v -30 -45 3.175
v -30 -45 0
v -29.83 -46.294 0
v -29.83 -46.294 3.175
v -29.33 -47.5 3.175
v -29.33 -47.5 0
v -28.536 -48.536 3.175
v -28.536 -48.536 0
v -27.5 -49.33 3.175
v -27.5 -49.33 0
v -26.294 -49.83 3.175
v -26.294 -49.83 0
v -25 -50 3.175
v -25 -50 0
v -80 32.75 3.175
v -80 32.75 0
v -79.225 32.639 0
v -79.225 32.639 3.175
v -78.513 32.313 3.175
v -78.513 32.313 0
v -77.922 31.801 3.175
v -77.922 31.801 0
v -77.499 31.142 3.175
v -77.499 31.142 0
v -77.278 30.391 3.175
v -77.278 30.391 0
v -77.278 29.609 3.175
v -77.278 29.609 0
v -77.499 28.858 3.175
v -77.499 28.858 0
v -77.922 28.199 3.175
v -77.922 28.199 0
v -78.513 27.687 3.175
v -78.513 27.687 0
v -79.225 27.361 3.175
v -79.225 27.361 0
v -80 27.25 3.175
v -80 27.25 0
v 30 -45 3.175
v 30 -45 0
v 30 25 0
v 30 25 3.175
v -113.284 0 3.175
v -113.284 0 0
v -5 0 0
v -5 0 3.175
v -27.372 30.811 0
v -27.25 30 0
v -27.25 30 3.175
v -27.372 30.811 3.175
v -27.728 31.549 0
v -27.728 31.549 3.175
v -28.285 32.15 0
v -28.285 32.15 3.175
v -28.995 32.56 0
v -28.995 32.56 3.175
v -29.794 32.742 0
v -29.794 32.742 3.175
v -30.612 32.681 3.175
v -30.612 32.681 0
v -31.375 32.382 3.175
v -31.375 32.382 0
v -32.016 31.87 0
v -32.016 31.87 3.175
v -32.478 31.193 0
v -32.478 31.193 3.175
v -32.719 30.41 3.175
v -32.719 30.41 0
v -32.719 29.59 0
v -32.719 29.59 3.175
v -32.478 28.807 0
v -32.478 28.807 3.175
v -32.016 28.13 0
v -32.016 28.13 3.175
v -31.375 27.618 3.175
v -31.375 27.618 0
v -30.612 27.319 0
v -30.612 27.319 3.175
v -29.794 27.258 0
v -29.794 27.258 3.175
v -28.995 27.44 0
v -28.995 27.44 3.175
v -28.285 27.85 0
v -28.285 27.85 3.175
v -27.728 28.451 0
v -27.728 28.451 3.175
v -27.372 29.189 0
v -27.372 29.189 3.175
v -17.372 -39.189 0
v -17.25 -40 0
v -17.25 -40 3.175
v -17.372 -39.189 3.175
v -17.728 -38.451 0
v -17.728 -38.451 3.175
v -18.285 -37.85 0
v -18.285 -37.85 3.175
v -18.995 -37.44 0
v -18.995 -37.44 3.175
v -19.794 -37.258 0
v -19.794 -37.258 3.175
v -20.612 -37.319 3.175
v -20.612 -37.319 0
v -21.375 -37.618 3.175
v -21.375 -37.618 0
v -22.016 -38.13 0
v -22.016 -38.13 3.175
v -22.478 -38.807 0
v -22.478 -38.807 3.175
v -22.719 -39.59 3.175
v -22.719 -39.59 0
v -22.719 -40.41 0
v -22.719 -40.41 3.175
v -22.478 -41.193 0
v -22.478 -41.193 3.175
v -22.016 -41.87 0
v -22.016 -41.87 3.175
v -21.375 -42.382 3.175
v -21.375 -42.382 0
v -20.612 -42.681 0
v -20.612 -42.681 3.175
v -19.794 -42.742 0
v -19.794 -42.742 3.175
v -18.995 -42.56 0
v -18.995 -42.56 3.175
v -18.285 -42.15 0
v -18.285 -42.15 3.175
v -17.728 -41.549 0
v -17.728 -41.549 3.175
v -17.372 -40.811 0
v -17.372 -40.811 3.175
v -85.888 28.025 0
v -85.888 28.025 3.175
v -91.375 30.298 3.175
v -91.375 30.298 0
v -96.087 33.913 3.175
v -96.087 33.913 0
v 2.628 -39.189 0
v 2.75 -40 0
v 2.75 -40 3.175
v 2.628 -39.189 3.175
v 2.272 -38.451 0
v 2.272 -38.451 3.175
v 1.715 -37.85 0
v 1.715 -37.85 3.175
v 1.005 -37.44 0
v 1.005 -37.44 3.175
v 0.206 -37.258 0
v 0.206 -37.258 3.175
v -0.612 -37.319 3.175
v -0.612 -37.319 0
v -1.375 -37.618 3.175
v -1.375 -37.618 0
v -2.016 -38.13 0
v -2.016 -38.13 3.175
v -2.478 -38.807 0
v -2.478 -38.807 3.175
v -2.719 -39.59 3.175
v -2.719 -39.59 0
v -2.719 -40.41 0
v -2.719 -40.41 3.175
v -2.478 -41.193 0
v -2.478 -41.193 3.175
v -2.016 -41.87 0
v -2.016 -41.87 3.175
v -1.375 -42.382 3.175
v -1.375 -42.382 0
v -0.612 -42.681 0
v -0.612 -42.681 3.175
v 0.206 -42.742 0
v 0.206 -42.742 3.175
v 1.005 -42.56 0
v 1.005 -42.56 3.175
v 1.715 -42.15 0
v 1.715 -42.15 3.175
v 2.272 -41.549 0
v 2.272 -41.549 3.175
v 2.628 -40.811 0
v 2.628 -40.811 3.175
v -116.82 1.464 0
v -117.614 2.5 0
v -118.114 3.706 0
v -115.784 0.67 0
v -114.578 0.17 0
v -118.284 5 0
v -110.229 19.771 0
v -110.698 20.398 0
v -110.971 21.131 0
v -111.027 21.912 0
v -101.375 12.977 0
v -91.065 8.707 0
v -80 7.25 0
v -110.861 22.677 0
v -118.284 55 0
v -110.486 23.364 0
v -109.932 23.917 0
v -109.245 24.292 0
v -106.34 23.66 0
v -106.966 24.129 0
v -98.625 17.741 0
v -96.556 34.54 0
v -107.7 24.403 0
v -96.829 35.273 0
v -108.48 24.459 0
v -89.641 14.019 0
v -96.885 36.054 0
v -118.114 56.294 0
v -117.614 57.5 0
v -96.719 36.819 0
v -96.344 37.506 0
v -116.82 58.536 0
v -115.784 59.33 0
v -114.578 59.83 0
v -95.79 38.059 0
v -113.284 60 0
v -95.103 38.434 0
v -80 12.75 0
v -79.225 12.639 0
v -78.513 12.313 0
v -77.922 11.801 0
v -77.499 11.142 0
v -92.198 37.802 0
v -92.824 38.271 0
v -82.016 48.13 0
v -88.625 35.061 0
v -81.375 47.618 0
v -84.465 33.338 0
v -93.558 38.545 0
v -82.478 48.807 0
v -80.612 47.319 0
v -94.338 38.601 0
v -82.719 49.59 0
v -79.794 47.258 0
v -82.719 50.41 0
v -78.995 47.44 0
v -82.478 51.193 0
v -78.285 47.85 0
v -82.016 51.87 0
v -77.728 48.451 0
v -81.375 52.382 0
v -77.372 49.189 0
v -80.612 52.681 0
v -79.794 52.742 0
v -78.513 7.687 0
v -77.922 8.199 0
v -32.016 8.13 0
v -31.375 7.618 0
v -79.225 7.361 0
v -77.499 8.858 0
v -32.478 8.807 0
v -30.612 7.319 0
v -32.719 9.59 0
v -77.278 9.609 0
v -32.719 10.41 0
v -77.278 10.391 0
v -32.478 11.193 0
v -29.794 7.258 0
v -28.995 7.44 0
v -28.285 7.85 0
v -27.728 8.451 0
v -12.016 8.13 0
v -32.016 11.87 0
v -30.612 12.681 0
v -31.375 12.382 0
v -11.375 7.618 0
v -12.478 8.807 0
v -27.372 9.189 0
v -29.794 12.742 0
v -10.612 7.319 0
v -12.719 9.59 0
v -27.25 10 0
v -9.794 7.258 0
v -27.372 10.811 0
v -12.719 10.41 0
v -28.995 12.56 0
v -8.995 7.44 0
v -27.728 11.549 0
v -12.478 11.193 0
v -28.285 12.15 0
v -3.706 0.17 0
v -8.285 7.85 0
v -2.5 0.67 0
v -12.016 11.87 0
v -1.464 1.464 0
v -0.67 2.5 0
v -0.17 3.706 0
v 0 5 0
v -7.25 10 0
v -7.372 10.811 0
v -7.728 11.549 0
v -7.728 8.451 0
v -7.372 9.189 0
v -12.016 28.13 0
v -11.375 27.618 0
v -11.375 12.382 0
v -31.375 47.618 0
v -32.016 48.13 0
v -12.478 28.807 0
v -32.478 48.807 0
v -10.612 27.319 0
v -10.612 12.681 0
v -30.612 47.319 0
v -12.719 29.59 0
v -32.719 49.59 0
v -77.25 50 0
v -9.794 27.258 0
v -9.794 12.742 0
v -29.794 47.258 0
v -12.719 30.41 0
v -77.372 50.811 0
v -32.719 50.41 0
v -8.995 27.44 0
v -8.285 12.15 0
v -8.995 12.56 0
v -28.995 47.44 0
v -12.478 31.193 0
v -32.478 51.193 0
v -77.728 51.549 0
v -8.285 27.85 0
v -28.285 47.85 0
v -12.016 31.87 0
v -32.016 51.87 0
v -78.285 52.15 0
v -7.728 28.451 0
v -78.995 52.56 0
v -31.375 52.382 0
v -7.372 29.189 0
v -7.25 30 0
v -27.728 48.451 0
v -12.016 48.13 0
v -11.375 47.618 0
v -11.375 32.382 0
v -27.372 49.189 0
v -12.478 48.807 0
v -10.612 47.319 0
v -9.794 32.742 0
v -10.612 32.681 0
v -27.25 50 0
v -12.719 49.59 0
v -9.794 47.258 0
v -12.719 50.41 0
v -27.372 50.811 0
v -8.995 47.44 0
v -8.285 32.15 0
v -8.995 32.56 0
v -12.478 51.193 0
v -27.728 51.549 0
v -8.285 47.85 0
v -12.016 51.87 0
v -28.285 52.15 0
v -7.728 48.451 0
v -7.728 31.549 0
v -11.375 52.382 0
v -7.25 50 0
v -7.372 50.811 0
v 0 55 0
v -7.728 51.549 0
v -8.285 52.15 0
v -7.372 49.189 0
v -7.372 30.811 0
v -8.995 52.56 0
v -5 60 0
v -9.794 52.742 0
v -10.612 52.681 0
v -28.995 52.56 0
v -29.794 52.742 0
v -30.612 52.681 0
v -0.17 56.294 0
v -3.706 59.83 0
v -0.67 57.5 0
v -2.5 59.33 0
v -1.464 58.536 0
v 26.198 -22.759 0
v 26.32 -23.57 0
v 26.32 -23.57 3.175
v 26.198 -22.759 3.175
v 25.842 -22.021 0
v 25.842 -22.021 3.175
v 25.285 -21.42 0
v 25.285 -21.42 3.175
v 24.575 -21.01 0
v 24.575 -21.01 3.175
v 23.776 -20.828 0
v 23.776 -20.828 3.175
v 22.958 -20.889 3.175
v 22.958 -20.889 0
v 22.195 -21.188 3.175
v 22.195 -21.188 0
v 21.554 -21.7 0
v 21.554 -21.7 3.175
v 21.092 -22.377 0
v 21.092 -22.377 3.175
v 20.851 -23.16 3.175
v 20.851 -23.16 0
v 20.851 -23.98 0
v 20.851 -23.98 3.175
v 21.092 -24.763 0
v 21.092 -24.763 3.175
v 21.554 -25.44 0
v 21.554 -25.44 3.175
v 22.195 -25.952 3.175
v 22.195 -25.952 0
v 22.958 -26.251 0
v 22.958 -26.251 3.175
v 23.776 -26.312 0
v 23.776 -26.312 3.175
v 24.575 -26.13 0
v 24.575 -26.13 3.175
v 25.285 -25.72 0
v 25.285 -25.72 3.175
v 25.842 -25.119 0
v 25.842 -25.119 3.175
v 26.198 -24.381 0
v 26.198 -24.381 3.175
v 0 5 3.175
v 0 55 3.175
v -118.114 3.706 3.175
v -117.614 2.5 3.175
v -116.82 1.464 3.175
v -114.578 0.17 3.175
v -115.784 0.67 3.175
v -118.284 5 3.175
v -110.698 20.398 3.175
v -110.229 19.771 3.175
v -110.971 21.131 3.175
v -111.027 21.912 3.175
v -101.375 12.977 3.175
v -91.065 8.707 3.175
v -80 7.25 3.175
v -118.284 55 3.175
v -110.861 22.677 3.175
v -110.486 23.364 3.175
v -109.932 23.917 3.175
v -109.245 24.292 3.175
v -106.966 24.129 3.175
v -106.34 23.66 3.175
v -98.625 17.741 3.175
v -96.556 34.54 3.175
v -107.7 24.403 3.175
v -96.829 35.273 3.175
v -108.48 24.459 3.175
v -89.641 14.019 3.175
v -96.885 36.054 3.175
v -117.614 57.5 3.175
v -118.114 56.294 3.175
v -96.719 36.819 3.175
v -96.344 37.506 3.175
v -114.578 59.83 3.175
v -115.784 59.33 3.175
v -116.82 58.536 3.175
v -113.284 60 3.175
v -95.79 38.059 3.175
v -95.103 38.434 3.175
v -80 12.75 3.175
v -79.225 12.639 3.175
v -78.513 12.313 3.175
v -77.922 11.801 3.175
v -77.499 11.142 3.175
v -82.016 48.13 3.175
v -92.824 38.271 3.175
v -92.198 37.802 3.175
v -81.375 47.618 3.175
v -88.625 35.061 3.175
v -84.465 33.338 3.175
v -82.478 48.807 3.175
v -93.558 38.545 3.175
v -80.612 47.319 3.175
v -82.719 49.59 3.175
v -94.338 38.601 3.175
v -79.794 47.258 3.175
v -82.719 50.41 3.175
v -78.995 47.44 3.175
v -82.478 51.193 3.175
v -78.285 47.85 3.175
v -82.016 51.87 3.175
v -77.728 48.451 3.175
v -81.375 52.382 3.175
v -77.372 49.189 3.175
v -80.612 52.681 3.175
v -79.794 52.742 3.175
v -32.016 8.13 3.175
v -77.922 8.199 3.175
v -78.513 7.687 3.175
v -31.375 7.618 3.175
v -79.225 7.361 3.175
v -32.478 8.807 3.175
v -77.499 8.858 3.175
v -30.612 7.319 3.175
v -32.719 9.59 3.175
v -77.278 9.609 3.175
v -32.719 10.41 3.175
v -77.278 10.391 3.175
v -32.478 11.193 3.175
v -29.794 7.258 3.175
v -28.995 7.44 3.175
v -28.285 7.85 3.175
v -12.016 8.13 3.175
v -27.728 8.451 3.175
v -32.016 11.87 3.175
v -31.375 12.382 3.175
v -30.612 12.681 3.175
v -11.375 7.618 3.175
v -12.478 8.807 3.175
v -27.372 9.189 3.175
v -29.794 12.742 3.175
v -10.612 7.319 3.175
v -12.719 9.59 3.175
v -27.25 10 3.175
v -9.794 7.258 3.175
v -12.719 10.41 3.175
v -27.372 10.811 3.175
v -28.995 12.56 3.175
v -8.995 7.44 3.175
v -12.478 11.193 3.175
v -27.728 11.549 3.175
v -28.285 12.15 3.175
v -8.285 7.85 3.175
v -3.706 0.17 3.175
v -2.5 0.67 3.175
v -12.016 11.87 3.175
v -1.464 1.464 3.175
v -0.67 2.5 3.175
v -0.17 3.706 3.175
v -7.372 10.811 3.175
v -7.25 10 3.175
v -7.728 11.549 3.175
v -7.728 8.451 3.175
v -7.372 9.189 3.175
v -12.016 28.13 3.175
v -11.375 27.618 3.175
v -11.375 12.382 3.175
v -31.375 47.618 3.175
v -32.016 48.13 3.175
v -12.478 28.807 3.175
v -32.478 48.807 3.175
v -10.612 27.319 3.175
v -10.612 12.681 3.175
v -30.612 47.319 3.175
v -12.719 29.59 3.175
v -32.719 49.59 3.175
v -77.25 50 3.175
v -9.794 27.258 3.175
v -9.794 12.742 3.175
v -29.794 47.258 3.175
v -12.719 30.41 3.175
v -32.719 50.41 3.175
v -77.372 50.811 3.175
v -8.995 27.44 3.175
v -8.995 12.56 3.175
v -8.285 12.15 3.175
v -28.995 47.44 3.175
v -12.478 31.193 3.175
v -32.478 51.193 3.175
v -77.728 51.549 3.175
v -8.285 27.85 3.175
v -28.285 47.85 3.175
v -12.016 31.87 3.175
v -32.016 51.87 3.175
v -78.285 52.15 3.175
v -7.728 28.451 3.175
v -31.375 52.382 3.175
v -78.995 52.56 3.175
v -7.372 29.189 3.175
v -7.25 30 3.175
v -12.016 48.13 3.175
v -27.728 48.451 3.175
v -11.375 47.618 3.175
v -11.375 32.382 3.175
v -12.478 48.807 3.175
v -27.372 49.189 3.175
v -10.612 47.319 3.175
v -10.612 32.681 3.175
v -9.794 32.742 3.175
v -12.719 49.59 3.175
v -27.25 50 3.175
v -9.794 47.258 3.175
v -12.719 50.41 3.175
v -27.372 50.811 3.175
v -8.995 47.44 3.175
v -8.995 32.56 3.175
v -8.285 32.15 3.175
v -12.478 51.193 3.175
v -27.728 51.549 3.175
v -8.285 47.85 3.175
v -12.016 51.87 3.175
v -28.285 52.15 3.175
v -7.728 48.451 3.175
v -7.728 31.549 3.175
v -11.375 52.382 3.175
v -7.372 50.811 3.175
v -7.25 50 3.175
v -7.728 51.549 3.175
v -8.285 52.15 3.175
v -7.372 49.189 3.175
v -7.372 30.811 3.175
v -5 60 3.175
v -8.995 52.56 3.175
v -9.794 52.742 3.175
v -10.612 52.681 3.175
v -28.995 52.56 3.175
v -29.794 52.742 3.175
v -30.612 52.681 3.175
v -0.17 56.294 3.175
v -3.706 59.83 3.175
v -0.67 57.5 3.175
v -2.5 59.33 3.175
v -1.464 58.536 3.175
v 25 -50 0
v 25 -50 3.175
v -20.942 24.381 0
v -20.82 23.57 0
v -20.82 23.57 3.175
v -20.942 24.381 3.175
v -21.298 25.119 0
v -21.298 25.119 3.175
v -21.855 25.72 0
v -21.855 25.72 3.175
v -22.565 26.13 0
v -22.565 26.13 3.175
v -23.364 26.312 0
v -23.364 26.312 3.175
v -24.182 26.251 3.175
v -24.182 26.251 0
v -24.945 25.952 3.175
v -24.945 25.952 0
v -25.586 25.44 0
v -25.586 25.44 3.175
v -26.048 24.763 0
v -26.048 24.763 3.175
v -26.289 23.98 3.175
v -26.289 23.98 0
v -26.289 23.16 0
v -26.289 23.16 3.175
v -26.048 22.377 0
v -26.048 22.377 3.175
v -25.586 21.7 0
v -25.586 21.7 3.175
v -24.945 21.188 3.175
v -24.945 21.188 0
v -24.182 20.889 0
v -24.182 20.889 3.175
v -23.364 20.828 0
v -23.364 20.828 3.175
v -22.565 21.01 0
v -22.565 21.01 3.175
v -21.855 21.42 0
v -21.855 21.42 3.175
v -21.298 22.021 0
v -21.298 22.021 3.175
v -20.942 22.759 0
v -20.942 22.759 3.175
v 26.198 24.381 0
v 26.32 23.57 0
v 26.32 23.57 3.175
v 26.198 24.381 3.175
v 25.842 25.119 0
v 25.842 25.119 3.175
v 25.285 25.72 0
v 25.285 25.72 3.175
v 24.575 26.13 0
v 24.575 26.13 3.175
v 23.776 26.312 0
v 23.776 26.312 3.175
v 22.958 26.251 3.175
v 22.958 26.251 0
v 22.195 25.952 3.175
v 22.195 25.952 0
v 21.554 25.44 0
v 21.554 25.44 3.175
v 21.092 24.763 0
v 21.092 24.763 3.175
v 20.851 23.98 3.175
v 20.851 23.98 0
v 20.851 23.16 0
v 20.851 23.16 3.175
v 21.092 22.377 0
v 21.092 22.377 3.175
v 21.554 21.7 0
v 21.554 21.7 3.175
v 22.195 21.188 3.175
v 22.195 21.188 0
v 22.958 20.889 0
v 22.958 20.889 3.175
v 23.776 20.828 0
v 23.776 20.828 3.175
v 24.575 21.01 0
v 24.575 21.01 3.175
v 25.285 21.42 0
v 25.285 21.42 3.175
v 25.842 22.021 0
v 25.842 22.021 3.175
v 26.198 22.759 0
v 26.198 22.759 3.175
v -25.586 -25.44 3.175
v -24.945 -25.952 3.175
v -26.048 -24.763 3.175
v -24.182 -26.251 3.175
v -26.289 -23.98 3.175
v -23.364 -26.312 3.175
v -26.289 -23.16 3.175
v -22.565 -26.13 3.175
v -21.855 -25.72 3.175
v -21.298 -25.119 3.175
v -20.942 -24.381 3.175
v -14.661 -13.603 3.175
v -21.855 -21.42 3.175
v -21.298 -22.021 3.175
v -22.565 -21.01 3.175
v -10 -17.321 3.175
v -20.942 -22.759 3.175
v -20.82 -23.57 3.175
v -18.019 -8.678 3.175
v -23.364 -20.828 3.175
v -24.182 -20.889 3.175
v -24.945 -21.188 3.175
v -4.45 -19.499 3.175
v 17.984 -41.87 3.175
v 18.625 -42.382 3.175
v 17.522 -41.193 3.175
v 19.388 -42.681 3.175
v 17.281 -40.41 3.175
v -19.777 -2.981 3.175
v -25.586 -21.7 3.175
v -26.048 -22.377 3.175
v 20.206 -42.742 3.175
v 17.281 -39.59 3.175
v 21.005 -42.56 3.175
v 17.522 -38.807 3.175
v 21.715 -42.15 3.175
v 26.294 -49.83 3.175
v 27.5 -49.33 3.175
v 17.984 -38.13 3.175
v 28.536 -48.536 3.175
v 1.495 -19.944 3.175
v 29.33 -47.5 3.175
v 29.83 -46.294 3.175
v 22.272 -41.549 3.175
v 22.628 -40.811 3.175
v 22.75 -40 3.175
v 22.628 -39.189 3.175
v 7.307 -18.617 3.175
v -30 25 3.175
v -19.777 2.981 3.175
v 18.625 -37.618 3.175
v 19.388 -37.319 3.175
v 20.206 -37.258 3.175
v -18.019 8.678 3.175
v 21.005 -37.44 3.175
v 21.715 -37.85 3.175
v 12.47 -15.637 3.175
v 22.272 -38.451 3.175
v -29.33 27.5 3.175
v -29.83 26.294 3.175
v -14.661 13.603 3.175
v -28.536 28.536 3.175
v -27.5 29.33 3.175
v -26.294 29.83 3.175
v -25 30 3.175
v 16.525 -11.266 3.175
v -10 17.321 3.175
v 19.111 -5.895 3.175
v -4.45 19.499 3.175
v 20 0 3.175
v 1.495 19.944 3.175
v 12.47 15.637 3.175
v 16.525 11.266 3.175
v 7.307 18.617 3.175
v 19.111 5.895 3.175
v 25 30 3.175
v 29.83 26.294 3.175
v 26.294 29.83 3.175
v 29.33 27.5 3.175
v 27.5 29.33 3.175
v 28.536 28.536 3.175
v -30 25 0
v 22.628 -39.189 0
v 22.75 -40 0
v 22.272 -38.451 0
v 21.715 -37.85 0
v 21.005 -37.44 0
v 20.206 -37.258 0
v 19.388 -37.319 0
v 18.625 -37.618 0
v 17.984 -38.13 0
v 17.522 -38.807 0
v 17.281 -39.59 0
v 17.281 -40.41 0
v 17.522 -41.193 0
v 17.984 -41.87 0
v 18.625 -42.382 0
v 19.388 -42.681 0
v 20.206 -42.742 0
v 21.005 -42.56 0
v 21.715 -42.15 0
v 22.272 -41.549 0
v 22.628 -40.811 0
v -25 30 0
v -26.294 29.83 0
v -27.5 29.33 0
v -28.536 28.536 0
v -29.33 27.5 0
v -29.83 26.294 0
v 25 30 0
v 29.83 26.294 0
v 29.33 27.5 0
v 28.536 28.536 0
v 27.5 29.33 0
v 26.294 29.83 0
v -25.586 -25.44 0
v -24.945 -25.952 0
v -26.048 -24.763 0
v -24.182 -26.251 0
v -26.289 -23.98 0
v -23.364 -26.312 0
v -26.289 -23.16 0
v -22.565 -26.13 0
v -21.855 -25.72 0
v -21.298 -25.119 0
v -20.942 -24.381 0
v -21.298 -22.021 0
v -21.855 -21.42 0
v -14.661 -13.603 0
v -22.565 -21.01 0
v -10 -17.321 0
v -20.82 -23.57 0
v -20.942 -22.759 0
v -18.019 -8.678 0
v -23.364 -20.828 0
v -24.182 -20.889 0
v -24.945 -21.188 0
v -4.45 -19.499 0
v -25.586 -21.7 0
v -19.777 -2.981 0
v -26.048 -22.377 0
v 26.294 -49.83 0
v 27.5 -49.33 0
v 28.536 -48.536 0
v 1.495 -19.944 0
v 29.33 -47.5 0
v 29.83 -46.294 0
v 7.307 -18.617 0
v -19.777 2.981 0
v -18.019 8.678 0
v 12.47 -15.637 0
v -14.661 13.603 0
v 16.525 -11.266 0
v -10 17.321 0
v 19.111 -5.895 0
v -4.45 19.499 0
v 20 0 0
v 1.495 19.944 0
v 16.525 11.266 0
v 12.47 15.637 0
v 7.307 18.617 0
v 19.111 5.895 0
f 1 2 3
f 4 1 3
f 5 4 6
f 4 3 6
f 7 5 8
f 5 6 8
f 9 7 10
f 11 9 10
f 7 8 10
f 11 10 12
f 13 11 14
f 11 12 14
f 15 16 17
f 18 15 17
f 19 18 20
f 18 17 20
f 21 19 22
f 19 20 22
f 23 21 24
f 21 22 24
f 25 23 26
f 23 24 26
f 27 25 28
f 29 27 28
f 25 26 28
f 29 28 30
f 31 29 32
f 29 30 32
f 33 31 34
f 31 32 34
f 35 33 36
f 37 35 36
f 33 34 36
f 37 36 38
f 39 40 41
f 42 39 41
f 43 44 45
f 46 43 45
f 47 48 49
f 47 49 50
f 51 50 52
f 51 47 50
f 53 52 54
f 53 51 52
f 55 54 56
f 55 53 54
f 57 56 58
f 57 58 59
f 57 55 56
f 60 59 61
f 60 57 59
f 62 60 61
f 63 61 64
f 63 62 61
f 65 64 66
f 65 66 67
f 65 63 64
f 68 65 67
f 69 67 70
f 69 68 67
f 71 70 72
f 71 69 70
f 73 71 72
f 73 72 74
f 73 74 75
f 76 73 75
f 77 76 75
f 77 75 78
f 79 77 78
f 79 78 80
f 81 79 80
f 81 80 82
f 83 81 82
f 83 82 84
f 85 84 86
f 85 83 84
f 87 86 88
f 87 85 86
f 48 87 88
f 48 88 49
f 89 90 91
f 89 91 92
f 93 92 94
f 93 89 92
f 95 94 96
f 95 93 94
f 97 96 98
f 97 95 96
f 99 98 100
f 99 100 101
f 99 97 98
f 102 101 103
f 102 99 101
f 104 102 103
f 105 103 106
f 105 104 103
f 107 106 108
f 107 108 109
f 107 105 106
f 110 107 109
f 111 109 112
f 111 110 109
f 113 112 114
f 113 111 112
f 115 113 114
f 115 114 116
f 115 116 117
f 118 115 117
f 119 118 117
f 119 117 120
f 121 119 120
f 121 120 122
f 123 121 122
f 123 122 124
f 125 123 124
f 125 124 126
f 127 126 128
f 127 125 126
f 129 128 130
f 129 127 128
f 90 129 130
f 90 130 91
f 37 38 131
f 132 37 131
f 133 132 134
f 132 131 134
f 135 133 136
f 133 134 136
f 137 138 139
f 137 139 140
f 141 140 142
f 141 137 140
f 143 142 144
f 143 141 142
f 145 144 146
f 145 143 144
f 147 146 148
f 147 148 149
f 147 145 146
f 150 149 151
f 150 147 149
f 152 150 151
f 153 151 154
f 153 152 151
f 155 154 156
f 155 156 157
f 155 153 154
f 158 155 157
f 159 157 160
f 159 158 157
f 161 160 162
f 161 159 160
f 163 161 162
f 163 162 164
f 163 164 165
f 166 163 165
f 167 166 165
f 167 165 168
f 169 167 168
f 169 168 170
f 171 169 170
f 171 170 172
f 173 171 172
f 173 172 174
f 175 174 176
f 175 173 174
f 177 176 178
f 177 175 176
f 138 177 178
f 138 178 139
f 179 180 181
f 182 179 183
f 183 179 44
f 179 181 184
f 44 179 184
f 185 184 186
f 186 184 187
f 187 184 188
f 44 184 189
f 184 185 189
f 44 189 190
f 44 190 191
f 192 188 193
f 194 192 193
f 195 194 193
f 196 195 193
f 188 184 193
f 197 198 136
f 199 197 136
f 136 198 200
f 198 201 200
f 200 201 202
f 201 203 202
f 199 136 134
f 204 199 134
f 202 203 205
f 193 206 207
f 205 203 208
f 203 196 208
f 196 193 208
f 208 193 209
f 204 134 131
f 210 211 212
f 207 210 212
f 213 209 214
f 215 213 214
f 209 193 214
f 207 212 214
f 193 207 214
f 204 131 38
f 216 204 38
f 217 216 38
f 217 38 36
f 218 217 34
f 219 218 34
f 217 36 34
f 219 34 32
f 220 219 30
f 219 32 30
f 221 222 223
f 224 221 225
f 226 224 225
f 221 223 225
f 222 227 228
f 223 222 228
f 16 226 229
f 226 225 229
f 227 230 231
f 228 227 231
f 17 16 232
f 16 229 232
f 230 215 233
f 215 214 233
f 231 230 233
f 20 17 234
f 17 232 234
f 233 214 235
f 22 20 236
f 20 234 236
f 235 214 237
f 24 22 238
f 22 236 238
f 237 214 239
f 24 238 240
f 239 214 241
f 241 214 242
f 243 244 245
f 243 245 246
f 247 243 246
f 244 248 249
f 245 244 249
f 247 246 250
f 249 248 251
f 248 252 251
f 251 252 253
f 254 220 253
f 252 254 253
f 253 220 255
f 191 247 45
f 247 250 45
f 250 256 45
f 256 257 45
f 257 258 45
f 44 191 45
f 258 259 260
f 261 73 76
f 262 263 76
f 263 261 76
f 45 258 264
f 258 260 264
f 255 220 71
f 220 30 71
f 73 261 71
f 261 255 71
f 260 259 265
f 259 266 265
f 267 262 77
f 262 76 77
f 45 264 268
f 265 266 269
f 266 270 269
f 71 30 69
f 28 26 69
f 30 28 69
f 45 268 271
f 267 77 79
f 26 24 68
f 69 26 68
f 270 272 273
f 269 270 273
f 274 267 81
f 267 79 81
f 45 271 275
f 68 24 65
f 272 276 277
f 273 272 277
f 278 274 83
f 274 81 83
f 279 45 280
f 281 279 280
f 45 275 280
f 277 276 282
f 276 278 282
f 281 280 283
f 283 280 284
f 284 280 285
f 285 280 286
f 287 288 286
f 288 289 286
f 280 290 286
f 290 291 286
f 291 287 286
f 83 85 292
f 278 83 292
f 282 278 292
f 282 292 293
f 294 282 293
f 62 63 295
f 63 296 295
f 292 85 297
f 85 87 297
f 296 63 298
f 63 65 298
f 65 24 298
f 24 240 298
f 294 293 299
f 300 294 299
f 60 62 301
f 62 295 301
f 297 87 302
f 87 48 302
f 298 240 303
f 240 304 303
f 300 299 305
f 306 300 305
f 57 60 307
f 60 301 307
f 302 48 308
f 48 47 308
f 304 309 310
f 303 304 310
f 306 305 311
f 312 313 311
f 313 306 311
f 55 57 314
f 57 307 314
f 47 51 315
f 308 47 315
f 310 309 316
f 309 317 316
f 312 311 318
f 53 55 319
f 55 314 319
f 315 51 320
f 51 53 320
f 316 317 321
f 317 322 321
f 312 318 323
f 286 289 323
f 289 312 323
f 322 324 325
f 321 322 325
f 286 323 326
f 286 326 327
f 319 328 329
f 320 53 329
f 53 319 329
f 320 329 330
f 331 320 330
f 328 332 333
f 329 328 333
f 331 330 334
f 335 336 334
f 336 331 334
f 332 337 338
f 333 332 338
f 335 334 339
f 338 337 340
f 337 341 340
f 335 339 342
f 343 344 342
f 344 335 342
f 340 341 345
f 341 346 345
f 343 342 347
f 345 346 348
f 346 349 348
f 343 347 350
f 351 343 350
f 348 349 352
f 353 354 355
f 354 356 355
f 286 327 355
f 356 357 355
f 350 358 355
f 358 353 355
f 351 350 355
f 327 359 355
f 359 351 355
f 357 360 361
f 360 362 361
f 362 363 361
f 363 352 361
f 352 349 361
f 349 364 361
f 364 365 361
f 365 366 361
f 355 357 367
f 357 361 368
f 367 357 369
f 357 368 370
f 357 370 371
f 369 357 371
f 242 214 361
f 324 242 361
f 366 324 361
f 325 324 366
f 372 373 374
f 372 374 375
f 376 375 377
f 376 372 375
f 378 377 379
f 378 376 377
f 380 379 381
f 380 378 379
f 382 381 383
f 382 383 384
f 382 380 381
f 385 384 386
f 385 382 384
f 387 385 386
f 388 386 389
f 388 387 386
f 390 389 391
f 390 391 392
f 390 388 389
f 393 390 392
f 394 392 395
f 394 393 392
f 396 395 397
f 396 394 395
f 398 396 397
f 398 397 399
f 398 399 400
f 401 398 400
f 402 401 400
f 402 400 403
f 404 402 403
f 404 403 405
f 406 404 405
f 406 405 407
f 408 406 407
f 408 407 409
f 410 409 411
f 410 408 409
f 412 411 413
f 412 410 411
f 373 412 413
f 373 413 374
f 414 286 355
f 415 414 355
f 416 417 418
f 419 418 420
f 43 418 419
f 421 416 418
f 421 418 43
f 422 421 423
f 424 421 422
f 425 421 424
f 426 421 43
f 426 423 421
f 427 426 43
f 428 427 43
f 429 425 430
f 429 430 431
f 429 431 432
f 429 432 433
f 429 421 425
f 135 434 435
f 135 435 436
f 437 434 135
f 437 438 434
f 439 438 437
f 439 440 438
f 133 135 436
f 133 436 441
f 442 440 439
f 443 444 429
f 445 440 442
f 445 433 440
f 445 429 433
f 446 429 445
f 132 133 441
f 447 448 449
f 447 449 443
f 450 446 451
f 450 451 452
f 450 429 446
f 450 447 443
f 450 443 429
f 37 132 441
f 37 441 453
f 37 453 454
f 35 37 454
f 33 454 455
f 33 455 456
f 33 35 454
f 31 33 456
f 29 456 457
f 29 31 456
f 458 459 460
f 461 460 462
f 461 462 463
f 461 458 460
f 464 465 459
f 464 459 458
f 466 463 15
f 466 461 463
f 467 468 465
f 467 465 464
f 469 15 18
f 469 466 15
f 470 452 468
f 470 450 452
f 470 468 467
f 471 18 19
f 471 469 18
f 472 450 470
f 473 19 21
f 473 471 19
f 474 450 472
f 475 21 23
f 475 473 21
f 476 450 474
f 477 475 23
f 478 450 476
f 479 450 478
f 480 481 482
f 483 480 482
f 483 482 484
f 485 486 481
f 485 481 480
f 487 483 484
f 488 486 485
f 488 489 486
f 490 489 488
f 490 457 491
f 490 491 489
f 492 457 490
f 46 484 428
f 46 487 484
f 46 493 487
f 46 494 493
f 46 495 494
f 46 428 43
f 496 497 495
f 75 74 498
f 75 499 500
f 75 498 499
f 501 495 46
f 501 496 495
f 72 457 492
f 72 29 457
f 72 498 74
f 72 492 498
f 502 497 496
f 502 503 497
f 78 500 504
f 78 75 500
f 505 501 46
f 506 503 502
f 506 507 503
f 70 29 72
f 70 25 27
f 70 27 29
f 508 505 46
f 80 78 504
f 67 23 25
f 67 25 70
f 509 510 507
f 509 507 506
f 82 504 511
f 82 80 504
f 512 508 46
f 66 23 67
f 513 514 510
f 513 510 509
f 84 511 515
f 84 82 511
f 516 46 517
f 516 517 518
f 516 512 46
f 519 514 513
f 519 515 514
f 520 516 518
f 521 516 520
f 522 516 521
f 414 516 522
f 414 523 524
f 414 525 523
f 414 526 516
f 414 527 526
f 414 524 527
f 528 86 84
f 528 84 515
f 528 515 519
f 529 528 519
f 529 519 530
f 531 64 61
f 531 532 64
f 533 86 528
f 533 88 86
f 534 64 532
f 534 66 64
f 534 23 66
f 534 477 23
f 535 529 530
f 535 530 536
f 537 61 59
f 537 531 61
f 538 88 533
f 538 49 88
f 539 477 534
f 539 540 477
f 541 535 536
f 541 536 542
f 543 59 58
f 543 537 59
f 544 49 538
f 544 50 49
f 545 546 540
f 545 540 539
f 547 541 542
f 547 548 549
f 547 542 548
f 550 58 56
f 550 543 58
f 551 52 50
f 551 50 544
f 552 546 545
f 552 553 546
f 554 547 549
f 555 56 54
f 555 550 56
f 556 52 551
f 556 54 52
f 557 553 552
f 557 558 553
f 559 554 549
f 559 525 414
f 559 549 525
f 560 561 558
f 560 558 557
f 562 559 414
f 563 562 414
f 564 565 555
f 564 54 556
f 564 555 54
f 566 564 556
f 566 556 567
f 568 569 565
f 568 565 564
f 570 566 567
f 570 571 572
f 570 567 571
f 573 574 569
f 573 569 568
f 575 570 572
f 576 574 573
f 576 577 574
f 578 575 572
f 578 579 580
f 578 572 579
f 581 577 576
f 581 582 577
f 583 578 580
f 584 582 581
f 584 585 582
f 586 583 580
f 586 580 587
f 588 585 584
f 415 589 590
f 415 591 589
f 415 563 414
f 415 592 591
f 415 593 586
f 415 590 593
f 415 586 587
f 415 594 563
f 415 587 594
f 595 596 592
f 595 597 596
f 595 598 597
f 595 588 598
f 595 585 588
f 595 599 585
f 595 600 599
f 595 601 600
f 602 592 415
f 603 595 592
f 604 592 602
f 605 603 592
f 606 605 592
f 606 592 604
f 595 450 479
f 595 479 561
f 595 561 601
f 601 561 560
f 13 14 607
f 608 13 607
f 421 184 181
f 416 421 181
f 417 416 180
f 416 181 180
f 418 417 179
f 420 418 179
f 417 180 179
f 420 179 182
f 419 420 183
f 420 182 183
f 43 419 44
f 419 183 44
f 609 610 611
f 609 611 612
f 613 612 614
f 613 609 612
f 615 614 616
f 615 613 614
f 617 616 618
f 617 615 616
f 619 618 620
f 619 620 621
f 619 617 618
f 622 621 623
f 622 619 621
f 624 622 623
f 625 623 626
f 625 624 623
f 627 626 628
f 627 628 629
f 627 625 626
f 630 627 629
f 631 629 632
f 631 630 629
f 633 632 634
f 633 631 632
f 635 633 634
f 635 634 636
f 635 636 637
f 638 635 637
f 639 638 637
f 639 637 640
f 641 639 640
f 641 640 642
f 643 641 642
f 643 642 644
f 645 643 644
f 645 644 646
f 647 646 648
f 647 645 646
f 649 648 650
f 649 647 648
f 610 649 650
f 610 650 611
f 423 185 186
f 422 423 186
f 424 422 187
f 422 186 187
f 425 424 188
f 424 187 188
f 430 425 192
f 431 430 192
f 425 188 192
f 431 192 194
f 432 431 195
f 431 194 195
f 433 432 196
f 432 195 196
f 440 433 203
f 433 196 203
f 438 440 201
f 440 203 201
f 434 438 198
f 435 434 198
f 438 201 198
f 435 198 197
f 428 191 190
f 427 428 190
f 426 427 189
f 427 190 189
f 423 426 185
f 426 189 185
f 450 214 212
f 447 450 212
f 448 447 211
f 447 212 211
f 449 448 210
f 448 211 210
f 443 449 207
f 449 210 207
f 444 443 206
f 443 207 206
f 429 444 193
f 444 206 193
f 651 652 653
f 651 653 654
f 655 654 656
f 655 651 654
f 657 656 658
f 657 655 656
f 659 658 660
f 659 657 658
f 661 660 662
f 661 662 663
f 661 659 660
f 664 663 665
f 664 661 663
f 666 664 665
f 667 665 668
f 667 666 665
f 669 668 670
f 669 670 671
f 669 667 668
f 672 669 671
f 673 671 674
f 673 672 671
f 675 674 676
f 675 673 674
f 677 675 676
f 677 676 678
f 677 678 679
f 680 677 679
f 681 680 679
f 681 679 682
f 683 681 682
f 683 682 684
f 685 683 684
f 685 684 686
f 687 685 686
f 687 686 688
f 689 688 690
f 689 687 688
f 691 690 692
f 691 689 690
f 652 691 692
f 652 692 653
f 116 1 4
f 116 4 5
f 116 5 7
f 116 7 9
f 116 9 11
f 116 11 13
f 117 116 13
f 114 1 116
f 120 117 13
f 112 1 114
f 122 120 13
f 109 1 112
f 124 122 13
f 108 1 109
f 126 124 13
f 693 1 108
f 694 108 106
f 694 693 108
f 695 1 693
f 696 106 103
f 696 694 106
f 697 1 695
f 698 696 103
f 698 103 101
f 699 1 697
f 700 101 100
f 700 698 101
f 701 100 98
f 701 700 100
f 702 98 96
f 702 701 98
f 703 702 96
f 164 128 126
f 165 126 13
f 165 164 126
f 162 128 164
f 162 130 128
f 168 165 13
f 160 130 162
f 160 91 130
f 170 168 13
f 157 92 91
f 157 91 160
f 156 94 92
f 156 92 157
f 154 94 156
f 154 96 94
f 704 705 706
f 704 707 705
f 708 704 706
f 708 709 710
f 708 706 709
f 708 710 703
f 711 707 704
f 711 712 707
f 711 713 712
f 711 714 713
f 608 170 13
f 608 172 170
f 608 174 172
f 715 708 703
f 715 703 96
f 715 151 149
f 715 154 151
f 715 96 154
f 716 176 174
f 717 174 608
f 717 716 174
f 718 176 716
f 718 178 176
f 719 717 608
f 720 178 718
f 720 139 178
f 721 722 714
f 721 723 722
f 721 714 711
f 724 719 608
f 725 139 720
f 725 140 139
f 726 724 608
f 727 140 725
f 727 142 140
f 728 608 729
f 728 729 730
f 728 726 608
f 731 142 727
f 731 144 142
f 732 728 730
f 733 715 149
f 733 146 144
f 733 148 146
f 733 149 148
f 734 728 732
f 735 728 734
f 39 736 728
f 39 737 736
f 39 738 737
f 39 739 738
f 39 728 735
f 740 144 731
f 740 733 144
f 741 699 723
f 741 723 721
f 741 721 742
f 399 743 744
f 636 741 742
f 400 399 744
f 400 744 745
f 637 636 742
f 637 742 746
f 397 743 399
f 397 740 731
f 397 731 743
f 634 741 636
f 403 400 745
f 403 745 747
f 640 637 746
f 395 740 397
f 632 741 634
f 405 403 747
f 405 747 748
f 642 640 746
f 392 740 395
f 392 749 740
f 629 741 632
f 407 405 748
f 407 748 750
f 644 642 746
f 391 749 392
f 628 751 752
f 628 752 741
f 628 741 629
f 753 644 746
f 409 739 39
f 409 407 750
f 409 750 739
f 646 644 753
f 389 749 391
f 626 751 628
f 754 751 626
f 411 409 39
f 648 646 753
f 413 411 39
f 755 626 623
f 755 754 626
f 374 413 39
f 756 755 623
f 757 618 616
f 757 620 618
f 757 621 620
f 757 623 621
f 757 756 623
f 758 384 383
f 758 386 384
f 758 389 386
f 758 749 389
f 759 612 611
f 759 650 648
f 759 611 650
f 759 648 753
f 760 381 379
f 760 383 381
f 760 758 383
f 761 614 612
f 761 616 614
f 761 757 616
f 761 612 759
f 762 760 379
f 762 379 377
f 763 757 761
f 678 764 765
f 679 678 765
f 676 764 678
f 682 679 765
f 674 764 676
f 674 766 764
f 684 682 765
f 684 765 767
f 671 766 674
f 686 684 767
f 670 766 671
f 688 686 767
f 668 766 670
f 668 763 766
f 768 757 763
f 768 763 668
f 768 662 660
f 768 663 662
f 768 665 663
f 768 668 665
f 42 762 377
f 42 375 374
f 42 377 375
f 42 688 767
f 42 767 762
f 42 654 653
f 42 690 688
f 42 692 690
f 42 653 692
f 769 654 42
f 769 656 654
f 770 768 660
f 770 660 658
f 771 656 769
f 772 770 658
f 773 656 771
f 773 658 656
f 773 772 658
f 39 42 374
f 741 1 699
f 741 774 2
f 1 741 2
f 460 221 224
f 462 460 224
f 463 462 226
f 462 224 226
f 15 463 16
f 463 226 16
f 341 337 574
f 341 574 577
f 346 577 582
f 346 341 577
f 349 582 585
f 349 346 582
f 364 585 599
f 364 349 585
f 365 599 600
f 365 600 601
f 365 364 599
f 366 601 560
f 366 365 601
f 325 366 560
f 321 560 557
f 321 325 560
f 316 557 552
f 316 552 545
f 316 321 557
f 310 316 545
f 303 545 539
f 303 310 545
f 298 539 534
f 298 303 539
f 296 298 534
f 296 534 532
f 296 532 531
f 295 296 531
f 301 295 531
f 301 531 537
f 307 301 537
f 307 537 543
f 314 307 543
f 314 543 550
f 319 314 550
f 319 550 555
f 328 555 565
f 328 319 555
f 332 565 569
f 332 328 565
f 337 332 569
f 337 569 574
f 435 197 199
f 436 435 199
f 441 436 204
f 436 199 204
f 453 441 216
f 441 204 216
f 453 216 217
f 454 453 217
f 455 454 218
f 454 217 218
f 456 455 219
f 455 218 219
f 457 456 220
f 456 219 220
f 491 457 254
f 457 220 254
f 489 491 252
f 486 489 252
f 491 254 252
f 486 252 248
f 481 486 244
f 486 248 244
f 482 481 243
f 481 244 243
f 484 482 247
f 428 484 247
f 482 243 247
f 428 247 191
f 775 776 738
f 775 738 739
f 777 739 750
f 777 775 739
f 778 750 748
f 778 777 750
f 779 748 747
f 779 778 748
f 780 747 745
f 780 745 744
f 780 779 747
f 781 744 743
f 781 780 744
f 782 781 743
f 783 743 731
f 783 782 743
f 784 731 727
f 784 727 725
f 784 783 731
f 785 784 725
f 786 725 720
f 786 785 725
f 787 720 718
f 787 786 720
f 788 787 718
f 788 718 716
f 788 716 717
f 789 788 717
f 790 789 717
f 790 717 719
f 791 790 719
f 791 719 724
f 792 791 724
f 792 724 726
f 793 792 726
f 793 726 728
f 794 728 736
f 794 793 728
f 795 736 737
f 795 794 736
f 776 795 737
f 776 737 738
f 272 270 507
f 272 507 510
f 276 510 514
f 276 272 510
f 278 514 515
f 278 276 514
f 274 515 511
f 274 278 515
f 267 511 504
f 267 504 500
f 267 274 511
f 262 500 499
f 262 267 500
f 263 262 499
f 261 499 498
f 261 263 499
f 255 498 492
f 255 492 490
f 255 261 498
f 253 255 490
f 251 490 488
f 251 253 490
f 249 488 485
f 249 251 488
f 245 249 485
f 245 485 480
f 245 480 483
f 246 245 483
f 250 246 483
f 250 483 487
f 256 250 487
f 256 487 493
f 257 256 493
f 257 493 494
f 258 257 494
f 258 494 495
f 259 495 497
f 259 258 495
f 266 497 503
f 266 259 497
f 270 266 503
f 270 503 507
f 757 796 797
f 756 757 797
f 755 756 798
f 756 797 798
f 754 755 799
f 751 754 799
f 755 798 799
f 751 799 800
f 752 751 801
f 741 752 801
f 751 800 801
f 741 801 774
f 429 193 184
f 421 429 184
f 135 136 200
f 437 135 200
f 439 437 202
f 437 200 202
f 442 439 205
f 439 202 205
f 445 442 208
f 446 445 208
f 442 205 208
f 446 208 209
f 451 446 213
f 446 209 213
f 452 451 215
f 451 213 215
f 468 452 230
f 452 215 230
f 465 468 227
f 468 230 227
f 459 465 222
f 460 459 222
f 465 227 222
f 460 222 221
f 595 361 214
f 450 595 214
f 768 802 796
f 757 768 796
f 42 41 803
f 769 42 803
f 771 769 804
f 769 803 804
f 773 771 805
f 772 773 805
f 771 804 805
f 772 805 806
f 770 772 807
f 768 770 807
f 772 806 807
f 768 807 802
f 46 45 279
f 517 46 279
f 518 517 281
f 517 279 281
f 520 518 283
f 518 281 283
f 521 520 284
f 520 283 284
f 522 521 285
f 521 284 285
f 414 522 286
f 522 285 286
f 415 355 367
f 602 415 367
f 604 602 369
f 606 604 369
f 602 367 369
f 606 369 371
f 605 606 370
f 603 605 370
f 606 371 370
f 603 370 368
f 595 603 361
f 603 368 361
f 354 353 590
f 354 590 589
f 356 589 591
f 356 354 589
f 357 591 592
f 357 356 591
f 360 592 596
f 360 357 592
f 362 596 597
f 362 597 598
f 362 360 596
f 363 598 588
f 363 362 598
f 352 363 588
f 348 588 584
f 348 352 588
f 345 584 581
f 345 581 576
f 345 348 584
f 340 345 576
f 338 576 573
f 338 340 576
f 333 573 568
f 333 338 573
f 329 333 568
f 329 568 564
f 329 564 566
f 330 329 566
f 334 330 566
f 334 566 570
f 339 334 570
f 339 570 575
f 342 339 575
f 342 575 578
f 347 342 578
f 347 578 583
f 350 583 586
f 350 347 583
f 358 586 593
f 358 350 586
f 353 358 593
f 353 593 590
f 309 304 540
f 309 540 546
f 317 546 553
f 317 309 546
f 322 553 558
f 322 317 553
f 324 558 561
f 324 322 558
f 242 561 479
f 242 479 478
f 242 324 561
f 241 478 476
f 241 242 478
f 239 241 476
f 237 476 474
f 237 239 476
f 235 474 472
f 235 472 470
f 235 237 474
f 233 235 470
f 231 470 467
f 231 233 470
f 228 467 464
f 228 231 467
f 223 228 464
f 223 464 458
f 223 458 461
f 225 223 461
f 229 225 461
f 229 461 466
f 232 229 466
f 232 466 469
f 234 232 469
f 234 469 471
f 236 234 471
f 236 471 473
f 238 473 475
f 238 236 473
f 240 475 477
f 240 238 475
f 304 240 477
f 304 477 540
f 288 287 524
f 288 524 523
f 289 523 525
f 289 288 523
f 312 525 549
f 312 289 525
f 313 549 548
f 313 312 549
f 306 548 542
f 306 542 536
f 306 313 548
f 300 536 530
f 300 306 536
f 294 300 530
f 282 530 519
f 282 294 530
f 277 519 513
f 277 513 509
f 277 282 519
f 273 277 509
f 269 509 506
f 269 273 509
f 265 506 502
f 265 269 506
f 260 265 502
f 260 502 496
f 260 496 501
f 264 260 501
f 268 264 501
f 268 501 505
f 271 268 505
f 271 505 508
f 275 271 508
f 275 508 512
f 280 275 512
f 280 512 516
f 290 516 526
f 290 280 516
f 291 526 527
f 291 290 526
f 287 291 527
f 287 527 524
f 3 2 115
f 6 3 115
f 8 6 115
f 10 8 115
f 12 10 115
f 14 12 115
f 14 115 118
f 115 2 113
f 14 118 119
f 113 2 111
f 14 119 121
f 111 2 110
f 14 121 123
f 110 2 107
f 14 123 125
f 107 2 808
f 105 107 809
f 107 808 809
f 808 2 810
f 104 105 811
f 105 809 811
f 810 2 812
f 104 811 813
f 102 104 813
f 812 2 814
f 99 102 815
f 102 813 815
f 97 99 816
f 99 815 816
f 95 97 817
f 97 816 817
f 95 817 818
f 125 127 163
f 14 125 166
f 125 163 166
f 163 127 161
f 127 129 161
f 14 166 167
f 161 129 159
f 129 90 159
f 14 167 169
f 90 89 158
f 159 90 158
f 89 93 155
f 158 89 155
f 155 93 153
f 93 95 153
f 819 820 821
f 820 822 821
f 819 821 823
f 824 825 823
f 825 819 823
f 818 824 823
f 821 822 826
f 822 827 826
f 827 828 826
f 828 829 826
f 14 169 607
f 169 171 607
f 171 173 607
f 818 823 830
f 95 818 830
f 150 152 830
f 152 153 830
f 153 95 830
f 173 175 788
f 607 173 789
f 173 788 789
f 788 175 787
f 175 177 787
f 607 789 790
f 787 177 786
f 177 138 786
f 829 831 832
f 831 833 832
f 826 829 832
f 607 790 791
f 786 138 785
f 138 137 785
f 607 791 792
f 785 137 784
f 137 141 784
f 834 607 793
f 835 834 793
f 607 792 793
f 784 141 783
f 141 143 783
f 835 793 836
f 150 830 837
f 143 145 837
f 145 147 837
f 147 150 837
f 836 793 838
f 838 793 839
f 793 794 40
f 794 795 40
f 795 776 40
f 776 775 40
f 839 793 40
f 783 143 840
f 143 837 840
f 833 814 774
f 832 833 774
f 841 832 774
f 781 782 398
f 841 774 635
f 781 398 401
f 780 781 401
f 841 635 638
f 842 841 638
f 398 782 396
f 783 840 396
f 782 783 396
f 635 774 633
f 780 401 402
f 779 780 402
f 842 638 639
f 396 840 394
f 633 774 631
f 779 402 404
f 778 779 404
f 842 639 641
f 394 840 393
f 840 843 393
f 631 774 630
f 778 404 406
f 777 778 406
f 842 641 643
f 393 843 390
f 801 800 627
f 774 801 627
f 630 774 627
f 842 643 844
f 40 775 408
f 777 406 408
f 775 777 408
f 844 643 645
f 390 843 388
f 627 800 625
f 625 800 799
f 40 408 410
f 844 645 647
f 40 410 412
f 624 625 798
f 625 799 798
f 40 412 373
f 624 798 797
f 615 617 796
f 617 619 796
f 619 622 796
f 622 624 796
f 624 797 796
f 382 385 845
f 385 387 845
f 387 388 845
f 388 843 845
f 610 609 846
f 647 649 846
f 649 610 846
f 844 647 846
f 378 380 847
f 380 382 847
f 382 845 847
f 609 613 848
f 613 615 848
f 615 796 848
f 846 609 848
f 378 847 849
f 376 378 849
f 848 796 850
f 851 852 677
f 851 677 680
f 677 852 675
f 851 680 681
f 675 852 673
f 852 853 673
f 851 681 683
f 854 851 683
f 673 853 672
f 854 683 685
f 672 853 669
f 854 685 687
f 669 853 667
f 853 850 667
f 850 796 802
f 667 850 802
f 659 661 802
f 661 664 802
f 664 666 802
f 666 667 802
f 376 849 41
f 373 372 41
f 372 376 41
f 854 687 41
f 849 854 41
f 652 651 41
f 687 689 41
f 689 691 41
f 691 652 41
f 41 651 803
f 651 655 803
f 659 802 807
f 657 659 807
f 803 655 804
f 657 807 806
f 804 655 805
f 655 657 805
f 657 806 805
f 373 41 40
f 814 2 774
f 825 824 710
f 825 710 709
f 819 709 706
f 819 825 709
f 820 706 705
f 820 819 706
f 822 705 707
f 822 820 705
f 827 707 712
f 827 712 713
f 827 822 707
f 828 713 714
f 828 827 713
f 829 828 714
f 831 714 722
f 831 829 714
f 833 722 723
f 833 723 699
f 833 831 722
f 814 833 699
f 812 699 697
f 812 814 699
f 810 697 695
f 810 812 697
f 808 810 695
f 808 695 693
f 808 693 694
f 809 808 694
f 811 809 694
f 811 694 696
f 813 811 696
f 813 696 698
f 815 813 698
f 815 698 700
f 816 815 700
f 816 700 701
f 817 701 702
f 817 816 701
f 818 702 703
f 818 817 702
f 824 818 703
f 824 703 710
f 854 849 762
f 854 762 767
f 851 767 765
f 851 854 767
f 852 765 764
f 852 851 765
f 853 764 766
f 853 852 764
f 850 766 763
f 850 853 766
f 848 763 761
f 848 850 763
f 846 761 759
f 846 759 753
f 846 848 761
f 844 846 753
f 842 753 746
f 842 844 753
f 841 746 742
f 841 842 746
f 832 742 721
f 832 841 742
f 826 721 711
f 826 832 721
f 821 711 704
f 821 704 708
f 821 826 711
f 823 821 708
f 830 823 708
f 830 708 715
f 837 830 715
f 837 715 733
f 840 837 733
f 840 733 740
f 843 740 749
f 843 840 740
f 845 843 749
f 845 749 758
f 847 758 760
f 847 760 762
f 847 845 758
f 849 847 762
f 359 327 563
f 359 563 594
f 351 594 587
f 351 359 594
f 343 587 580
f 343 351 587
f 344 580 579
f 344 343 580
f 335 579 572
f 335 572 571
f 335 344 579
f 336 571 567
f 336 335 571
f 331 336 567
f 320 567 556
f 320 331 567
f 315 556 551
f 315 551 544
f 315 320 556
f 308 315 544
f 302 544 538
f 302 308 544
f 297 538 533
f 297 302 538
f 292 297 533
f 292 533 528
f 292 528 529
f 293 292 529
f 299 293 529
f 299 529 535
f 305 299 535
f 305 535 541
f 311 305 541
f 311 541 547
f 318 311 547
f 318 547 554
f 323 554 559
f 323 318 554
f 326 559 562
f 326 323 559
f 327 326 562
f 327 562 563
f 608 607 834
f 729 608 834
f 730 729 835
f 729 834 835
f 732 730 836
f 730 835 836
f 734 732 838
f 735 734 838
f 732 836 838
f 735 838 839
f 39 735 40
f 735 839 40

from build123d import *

# Parameters (mm, degrees)
F0_R     = 2.75
F0_R_2   = 20
F1_DEPTH = 3.175
F2_R     = 2.75
F3_DEPTH = 3.175


# Not quite as in the source:
# - a length typed as a fraction of an inch, garbled in the dataset ("3 / 203.2 mm" for 3/8 in), is restored


with BuildPart() as f1:
    # F0 (on Top) → F1 (new body)
    with BuildSketch(Plane.XY):
        with BuildLine():
            Line((30, -45), (30, -30))
            Line((30, -30), (30, 25))
            ThreePointArc((30, 25), (28.5355339059, 28.5355339059), (25, 30))
            Line((25, 30), (-25, 30))
            ThreePointArc((-25, 30), (-28.5355339059, 28.5355339059), (-30, 25))
            Line((-30, 25), (-30, -30))
            Line((-30, -30), (-30, -45))
            ThreePointArc((-30, -45), (-28.5355339059, -48.5355339059), (-25, -50))
            Line((-25, -50), (25, -50))
            ThreePointArc((25, -50), (28.5355339059, -48.5355339059), (30, -45))
        make_face()
        with Locations((-20, -40)):
            Circle(F0_R, mode=Mode.SUBTRACT)
        with Locations((0, -40)):
            Circle(F0_R, mode=Mode.SUBTRACT)
        with Locations((-23.57, -23.57)):
            Circle(F0_R, mode=Mode.SUBTRACT)
        with Locations((20, -40)):
            Circle(F0_R, mode=Mode.SUBTRACT)
        with Locations((23.57, -23.57)):
            Circle(F0_R, mode=Mode.SUBTRACT)
        Circle(F0_R_2, mode=Mode.SUBTRACT)
        with Locations((-23.57, 23.57)):
            Circle(F0_R, mode=Mode.SUBTRACT)
        with Locations((23.57, 23.57)):
            Circle(F0_R, mode=Mode.SUBTRACT)
    extrude(amount=F1_DEPTH)


with BuildPart() as f3:
    # F2 (on Top) → F3 (new body)
    with BuildSketch(Plane.XY):
        with BuildLine():
            Line((-113.2842712475, 0), (-5, 0))
            ThreePointArc((-5, 0), (-1.4644660941, 1.4644660941), (0, 5))
            Line((0, 5), (0, 55))
            ThreePointArc((0, 55), (-1.4644660941, 58.5355339059), (-5, 60))
            Line((-5, 60), (-113.2842712475, 60))
            ThreePointArc((-113.2842712475, 60), (-116.8198051534, 58.5355339059), (-118.2842712475, 55))
            Line((-118.2842712475, 55), (-118.2842712475, 5))
            ThreePointArc((-118.2842712475, 5), (-116.8198051534, 1.4644660941), (-113.2842712475, 0))
        make_face()
        with BuildLine():
            ThreePointArc((-110.2288148957, 19.7711851043), (-110.2288148957, 23.6602724008), (-106.3397275992, 23.6602724008))
            ThreePointArc((-106.3397275992, 23.6602724008), (-94.2549578556, 15.585487414), (-80, 12.75))
            ThreePointArc((-80, 12.75), (-77.25, 10), (-80, 7.25))
            ThreePointArc((-80, 7.25), (-96.3597167336, 10.5041499851), (-110.2288148957, 19.7711851043))
        make_face(mode=Mode.SUBTRACT)
        with Locations((-30, 10)):
            Circle(F2_R, mode=Mode.SUBTRACT)
        with Locations((-10, 10)):
            Circle(F2_R, mode=Mode.SUBTRACT)
        with BuildLine():
            ThreePointArc((-96.086679272, 33.913320728), (-96.086679272, 37.8024080245), (-92.1975919755, 37.8024080245))
            ThreePointArc((-92.1975919755, 37.8024080245), (-86.6012892083, 34.0630780642), (-80, 32.75))
            ThreePointArc((-80, 32.75), (-77.25, 30), (-80, 27.25))
            ThreePointArc((-80, 27.25), (-88.7060480863, 28.9817406354), (-96.086679272, 33.913320728))
        make_face(mode=Mode.SUBTRACT)
        with Locations((-80, 50)):
            Circle(F2_R, mode=Mode.SUBTRACT)
        with Locations((-30, 30)):
            Circle(F2_R, mode=Mode.SUBTRACT)
        with Locations((-10, 30)):
            Circle(F2_R, mode=Mode.SUBTRACT)
        with Locations((-30, 50)):
            Circle(F2_R, mode=Mode.SUBTRACT)
        with Locations((-10, 50)):
            Circle(F2_R, mode=Mode.SUBTRACT)
    extrude(amount=F3_DEPTH)


solid = Compound([f1.part, f3.part])
